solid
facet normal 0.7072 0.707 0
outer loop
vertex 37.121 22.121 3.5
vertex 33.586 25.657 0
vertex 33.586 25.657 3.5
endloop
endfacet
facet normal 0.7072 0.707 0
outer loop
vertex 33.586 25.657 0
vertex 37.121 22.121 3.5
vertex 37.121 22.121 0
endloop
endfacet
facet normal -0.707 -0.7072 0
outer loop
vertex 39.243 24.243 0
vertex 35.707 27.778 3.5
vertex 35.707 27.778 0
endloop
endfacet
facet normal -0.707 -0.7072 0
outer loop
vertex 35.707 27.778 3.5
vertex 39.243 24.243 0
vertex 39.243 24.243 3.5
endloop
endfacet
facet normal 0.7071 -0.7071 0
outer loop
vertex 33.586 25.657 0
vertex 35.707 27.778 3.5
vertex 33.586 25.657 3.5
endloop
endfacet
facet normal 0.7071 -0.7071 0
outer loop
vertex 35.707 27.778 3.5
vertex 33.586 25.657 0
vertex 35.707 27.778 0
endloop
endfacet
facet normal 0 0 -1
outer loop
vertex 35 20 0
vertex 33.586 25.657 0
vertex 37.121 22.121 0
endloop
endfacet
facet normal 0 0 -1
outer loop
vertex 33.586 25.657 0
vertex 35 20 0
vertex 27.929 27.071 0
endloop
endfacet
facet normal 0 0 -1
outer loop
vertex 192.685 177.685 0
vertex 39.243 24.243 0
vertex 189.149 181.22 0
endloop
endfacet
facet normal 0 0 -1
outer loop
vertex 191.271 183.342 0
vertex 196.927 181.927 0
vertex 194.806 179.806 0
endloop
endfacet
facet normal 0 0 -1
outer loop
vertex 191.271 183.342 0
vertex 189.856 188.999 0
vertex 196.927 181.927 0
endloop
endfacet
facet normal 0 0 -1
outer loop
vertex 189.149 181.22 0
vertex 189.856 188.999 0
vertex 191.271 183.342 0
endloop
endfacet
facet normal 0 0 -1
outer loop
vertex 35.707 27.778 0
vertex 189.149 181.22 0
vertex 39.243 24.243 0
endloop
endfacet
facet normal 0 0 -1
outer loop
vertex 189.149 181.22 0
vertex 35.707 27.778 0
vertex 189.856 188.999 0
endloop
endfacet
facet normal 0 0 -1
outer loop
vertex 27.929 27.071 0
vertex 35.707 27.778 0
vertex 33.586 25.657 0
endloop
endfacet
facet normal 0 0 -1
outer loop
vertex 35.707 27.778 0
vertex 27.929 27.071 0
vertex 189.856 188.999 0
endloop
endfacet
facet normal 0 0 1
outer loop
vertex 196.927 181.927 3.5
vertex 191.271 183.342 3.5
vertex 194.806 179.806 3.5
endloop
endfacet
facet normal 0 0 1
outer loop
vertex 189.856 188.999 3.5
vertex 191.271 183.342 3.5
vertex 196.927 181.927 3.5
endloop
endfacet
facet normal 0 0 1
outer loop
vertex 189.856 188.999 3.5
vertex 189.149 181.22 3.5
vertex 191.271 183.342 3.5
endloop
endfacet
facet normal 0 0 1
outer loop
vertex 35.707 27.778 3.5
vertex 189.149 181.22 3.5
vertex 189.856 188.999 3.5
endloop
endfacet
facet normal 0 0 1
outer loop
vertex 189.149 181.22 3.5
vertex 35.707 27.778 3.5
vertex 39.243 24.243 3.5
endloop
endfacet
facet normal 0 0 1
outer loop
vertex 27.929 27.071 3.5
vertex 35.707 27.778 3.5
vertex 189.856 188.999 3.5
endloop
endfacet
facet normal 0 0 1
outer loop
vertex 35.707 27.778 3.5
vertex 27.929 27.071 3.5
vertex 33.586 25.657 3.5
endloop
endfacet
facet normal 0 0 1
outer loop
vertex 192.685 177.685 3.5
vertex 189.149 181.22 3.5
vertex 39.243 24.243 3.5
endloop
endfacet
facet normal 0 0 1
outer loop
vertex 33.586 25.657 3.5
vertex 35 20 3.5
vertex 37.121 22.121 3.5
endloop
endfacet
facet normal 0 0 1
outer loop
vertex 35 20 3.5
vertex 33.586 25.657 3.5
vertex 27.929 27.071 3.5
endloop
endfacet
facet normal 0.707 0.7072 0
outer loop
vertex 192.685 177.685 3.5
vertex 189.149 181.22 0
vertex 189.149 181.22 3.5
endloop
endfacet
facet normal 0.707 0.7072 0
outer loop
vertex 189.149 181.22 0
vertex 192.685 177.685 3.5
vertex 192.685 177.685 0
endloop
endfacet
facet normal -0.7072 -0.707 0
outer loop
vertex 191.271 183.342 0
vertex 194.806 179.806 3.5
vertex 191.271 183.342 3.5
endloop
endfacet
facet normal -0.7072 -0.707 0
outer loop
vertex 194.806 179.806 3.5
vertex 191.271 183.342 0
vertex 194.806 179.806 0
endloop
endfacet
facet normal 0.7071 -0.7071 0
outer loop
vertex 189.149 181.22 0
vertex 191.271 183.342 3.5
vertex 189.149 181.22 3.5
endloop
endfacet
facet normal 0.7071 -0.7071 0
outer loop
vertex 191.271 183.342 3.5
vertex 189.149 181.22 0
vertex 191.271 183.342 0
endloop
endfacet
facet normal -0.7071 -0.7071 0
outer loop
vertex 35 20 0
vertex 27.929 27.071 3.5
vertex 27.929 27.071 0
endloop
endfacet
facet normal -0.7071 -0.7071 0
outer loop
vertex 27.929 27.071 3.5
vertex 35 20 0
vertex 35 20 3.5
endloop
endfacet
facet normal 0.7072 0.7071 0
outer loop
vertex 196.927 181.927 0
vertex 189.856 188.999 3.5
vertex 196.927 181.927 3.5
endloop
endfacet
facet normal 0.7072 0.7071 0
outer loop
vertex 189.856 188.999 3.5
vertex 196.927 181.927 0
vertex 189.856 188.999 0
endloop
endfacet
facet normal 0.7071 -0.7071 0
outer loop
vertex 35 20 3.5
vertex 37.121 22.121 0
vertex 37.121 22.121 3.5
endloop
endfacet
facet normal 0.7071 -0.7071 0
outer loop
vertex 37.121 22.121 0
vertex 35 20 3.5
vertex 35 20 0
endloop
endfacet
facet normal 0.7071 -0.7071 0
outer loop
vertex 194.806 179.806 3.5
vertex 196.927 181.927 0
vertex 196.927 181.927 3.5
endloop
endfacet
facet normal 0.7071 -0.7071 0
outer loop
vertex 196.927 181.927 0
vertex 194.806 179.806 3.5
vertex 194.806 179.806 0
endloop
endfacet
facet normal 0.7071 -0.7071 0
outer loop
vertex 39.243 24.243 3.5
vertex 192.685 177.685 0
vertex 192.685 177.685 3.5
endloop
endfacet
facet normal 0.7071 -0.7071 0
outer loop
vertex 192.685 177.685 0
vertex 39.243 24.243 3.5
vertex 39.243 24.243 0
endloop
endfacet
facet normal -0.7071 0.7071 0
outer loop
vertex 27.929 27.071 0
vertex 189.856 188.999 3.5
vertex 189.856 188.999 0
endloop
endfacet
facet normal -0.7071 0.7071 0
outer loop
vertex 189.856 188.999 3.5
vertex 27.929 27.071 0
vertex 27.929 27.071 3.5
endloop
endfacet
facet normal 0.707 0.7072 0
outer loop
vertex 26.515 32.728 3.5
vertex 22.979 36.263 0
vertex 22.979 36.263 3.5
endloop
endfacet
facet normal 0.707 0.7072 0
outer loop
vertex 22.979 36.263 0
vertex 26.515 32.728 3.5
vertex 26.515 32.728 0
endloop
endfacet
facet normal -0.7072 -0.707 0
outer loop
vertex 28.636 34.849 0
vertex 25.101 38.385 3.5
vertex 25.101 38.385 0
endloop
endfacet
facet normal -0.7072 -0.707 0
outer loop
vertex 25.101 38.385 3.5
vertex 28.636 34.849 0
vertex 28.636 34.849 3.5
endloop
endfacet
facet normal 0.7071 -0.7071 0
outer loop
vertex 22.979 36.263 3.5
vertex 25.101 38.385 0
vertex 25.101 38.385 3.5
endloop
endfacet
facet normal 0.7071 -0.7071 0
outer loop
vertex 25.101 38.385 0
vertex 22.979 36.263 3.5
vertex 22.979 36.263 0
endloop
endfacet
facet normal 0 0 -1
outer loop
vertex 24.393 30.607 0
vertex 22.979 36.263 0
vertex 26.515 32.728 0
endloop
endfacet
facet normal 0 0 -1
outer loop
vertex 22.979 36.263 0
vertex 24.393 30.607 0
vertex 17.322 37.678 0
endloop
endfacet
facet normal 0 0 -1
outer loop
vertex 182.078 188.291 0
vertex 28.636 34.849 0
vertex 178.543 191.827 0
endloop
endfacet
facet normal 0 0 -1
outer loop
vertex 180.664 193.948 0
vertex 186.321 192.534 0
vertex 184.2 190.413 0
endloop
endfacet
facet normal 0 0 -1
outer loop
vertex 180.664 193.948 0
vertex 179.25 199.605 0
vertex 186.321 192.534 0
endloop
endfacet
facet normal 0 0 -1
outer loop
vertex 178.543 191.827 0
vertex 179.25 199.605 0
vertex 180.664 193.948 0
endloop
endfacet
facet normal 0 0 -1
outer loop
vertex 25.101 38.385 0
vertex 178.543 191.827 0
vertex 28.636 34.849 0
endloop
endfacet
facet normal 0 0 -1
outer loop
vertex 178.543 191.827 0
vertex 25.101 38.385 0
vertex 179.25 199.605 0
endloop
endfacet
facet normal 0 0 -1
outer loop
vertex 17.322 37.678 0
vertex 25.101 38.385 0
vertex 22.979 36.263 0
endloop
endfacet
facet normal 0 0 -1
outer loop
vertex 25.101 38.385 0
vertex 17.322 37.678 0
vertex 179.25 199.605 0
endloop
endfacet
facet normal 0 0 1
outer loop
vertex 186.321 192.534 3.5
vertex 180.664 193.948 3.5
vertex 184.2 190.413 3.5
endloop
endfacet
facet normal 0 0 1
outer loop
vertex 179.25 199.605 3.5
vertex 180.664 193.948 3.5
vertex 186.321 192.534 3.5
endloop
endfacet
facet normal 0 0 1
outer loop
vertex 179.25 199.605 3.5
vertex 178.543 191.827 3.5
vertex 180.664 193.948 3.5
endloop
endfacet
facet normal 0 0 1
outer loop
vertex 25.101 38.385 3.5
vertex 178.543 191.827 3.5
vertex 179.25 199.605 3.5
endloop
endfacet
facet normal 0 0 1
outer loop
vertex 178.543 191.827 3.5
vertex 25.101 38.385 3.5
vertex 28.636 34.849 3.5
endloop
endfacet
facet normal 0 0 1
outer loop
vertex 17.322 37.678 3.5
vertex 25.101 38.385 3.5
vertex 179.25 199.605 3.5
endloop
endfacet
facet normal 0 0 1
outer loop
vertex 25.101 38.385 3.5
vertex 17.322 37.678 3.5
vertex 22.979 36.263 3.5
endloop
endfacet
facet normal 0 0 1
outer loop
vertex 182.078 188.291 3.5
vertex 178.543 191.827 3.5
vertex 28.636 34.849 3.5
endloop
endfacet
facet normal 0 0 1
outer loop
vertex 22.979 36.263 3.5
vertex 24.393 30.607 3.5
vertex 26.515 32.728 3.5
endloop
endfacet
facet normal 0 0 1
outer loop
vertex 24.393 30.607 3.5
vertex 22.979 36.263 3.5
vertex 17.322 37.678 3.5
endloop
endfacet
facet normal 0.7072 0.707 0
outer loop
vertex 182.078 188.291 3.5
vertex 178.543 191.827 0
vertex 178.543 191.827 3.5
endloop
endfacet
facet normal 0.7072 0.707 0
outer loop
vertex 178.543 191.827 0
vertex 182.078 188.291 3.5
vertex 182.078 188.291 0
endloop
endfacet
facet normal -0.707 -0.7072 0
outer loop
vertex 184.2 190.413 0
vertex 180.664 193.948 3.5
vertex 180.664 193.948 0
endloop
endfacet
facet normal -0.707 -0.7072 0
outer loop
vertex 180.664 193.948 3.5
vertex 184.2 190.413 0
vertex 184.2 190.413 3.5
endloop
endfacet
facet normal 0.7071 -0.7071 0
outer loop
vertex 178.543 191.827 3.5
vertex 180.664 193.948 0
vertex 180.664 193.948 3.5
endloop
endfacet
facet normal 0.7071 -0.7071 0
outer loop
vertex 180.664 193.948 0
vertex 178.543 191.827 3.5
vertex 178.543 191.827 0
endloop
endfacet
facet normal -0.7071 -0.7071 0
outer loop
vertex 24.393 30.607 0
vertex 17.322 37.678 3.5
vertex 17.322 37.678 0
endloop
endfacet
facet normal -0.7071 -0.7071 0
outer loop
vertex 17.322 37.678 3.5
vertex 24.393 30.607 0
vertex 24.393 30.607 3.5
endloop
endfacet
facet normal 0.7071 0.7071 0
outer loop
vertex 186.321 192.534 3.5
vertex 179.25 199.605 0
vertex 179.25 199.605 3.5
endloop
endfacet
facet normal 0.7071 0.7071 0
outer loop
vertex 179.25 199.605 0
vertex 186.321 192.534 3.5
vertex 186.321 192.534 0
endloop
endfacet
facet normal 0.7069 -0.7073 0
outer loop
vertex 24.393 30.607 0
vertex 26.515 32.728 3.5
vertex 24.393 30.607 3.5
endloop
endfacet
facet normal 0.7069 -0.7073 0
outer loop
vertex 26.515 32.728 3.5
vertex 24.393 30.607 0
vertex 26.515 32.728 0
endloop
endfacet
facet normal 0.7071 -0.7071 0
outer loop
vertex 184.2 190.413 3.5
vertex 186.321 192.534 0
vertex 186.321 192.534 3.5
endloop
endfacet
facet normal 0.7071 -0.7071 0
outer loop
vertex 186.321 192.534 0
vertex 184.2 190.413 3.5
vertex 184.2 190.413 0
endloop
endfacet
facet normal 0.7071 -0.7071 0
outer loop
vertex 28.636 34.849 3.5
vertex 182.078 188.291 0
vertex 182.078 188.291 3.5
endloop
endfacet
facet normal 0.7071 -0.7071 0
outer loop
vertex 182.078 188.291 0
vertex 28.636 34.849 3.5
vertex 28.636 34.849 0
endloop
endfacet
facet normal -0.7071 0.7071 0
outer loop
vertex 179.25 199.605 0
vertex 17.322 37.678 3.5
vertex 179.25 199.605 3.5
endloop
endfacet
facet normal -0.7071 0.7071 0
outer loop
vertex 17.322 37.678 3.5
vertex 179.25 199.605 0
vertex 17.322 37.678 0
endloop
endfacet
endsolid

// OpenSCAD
$fn = 100;

// ************
// *** RACK ***
// ************

module Cutout() {
    cube([6, 3.5, 5], center = false);
}

module Panel() {
    difference() {
        cube([140, 96, 3], center = false);
        translate([-1, 8.25, -1]) Cutout();
        translate([135, 3.25, -1]) Cutout();
        translate([-1, 84.25, -1]) Cutout();
        translate([135, 89.25, -1]) Cutout();
    }
}

module BottleBottom() {
    cylinder(5, d = 76, center = false);
}

module BottleNeck() {
    cylinder(5, d = 35.5, center = false);
}

module Bottle() {
    cylinder(5, d = 86, center = false);
}

module RearPanel() {
    difference() {
        Panel();
        translate([48, 48, -1]) BottleBottom();
        translate([140, 48, -1]) BottleBottom();
    }
}

module FrontPanel() {
    difference() {
        Panel();
        translate([48, 48, -1]) BottleNeck();
        translate([76.25, 48, -1]) Bottle();
        translate([140, 48, -1]) BottleNeck();
    }
}

// ************
// *** BASE ***
// ************

eps = 0.1;

module BottomBrace() {
    dimens = [9, 15, 15];
    cube([dimens.x, dimens.y, dimens.z + eps], center = false);
}

module Base() {
    dimens = [280, 102, 5];
    difference() {
        union() {
            cube([dimens.x, dimens.y, dimens.z]);
            translate([25, 0, dimens.z - eps]) BottomBrace();
            translate([25, dimens.y - 15, dimens.z - eps]) BottomBrace();
            translate([25 + 3 + 217, 0, dimens.z - eps]) BottomBrace();
            translate([25 + 3 + 217, dimens.y - 15, dimens.z - eps]) BottomBrace();
        }
        translate([31, 3, dimens.z]) rotate([0, 270, 0]) FrontPanel();
        translate([25 + 3 + 3 + 3 + 217, 3, dimens.z]) rotate([0, 270, 0]) RearPanel();
    }
}

module CutOff() {
    dimens = [142, 104, 30];
    cube([dimens.x, dimens.y, dimens.z], center = false);
}

module Key() {
    eps = 5;
    dimens = [140, 102, 2.5];
    key_diameter = dimens.y / 4;
    translate([dimens.x + (key_diameter / 2) - eps, key_diameter, 0]) cylinder(dimens.z, d = key_diameter, center = false);
}

module Lock() {
    eps = 5;
    dimens = [140, 102, 2.5];
    lock_diameter = dimens.y / 4;
    translate([dimens.x - (lock_diameter / 2) + eps, lock_diameter * 3, -0.1]) cylinder(dimens.z + 0.2, d = lock_diameter, center = false);
}

module FrontBase() {
    union() {
        difference() {
            Base();
            translate([140, -1, -1]) CutOff();
            Lock();
        }
        Key();
    }
}

module RearBase() {
    union() {
        difference() {
            rotate([0, 0, 180]) translate([-280, -102, 0]) Base();
            translate([140, -1, -1]) CutOff();
            Lock();
        }
        Key();
    }
}

// *************
// *** BRACE ***
// *************

module TopBrace() {
    translate([0, 0, 3]) {
        rotate([-90, 0, 0]) translate([-25, -6.75, -135]) {
            difference() {
                translate([25, 6.75, 135]) { translate([0, 3, 0]) rotate([90, 0, 0]) cube([229, 10, 3.5]); };
                translate([31, 3, 5]) rotate([0, 270, 0]) FrontPanel();
                translate([25 + 3 + 3 + 3 + 217, 3, 5]) rotate([0, 270, 0]) RearPanel();
            }
        }
    }
}

// *************
// *** MODEL ***
// *************

// FrontBase();
// translate([280, 102, 0]) rotate([0, 0, 180]) RearBase();
// translate([31, 3, 5]) rotate([0, 270, 0]) FrontPanel();
// translate([25 + 3 + 3 + 3 + 217, 3, 5]) rotate([0, 270, 0]) RearPanel();
// translate([25, 6.75, 135]) { translate([0, 3, 0]) rotate([90, 0, 0]) TopBrace(); };
// translate([25, 92.75, 135]) { translate([0, 3, 0]) rotate([90, 0, 0]) TopBrace(); };

// *************
// *** PRINT ***
// *************

// translate([30, 50, 0]) FrontBase();
// translate([30, 50, 0]) RearBase();
// FrontPanel();
// RearPanel();
translate([35, 20, 0]) rotate(45) {
    TopBrace();
    translate([0, 15, 0]) TopBrace();
}
